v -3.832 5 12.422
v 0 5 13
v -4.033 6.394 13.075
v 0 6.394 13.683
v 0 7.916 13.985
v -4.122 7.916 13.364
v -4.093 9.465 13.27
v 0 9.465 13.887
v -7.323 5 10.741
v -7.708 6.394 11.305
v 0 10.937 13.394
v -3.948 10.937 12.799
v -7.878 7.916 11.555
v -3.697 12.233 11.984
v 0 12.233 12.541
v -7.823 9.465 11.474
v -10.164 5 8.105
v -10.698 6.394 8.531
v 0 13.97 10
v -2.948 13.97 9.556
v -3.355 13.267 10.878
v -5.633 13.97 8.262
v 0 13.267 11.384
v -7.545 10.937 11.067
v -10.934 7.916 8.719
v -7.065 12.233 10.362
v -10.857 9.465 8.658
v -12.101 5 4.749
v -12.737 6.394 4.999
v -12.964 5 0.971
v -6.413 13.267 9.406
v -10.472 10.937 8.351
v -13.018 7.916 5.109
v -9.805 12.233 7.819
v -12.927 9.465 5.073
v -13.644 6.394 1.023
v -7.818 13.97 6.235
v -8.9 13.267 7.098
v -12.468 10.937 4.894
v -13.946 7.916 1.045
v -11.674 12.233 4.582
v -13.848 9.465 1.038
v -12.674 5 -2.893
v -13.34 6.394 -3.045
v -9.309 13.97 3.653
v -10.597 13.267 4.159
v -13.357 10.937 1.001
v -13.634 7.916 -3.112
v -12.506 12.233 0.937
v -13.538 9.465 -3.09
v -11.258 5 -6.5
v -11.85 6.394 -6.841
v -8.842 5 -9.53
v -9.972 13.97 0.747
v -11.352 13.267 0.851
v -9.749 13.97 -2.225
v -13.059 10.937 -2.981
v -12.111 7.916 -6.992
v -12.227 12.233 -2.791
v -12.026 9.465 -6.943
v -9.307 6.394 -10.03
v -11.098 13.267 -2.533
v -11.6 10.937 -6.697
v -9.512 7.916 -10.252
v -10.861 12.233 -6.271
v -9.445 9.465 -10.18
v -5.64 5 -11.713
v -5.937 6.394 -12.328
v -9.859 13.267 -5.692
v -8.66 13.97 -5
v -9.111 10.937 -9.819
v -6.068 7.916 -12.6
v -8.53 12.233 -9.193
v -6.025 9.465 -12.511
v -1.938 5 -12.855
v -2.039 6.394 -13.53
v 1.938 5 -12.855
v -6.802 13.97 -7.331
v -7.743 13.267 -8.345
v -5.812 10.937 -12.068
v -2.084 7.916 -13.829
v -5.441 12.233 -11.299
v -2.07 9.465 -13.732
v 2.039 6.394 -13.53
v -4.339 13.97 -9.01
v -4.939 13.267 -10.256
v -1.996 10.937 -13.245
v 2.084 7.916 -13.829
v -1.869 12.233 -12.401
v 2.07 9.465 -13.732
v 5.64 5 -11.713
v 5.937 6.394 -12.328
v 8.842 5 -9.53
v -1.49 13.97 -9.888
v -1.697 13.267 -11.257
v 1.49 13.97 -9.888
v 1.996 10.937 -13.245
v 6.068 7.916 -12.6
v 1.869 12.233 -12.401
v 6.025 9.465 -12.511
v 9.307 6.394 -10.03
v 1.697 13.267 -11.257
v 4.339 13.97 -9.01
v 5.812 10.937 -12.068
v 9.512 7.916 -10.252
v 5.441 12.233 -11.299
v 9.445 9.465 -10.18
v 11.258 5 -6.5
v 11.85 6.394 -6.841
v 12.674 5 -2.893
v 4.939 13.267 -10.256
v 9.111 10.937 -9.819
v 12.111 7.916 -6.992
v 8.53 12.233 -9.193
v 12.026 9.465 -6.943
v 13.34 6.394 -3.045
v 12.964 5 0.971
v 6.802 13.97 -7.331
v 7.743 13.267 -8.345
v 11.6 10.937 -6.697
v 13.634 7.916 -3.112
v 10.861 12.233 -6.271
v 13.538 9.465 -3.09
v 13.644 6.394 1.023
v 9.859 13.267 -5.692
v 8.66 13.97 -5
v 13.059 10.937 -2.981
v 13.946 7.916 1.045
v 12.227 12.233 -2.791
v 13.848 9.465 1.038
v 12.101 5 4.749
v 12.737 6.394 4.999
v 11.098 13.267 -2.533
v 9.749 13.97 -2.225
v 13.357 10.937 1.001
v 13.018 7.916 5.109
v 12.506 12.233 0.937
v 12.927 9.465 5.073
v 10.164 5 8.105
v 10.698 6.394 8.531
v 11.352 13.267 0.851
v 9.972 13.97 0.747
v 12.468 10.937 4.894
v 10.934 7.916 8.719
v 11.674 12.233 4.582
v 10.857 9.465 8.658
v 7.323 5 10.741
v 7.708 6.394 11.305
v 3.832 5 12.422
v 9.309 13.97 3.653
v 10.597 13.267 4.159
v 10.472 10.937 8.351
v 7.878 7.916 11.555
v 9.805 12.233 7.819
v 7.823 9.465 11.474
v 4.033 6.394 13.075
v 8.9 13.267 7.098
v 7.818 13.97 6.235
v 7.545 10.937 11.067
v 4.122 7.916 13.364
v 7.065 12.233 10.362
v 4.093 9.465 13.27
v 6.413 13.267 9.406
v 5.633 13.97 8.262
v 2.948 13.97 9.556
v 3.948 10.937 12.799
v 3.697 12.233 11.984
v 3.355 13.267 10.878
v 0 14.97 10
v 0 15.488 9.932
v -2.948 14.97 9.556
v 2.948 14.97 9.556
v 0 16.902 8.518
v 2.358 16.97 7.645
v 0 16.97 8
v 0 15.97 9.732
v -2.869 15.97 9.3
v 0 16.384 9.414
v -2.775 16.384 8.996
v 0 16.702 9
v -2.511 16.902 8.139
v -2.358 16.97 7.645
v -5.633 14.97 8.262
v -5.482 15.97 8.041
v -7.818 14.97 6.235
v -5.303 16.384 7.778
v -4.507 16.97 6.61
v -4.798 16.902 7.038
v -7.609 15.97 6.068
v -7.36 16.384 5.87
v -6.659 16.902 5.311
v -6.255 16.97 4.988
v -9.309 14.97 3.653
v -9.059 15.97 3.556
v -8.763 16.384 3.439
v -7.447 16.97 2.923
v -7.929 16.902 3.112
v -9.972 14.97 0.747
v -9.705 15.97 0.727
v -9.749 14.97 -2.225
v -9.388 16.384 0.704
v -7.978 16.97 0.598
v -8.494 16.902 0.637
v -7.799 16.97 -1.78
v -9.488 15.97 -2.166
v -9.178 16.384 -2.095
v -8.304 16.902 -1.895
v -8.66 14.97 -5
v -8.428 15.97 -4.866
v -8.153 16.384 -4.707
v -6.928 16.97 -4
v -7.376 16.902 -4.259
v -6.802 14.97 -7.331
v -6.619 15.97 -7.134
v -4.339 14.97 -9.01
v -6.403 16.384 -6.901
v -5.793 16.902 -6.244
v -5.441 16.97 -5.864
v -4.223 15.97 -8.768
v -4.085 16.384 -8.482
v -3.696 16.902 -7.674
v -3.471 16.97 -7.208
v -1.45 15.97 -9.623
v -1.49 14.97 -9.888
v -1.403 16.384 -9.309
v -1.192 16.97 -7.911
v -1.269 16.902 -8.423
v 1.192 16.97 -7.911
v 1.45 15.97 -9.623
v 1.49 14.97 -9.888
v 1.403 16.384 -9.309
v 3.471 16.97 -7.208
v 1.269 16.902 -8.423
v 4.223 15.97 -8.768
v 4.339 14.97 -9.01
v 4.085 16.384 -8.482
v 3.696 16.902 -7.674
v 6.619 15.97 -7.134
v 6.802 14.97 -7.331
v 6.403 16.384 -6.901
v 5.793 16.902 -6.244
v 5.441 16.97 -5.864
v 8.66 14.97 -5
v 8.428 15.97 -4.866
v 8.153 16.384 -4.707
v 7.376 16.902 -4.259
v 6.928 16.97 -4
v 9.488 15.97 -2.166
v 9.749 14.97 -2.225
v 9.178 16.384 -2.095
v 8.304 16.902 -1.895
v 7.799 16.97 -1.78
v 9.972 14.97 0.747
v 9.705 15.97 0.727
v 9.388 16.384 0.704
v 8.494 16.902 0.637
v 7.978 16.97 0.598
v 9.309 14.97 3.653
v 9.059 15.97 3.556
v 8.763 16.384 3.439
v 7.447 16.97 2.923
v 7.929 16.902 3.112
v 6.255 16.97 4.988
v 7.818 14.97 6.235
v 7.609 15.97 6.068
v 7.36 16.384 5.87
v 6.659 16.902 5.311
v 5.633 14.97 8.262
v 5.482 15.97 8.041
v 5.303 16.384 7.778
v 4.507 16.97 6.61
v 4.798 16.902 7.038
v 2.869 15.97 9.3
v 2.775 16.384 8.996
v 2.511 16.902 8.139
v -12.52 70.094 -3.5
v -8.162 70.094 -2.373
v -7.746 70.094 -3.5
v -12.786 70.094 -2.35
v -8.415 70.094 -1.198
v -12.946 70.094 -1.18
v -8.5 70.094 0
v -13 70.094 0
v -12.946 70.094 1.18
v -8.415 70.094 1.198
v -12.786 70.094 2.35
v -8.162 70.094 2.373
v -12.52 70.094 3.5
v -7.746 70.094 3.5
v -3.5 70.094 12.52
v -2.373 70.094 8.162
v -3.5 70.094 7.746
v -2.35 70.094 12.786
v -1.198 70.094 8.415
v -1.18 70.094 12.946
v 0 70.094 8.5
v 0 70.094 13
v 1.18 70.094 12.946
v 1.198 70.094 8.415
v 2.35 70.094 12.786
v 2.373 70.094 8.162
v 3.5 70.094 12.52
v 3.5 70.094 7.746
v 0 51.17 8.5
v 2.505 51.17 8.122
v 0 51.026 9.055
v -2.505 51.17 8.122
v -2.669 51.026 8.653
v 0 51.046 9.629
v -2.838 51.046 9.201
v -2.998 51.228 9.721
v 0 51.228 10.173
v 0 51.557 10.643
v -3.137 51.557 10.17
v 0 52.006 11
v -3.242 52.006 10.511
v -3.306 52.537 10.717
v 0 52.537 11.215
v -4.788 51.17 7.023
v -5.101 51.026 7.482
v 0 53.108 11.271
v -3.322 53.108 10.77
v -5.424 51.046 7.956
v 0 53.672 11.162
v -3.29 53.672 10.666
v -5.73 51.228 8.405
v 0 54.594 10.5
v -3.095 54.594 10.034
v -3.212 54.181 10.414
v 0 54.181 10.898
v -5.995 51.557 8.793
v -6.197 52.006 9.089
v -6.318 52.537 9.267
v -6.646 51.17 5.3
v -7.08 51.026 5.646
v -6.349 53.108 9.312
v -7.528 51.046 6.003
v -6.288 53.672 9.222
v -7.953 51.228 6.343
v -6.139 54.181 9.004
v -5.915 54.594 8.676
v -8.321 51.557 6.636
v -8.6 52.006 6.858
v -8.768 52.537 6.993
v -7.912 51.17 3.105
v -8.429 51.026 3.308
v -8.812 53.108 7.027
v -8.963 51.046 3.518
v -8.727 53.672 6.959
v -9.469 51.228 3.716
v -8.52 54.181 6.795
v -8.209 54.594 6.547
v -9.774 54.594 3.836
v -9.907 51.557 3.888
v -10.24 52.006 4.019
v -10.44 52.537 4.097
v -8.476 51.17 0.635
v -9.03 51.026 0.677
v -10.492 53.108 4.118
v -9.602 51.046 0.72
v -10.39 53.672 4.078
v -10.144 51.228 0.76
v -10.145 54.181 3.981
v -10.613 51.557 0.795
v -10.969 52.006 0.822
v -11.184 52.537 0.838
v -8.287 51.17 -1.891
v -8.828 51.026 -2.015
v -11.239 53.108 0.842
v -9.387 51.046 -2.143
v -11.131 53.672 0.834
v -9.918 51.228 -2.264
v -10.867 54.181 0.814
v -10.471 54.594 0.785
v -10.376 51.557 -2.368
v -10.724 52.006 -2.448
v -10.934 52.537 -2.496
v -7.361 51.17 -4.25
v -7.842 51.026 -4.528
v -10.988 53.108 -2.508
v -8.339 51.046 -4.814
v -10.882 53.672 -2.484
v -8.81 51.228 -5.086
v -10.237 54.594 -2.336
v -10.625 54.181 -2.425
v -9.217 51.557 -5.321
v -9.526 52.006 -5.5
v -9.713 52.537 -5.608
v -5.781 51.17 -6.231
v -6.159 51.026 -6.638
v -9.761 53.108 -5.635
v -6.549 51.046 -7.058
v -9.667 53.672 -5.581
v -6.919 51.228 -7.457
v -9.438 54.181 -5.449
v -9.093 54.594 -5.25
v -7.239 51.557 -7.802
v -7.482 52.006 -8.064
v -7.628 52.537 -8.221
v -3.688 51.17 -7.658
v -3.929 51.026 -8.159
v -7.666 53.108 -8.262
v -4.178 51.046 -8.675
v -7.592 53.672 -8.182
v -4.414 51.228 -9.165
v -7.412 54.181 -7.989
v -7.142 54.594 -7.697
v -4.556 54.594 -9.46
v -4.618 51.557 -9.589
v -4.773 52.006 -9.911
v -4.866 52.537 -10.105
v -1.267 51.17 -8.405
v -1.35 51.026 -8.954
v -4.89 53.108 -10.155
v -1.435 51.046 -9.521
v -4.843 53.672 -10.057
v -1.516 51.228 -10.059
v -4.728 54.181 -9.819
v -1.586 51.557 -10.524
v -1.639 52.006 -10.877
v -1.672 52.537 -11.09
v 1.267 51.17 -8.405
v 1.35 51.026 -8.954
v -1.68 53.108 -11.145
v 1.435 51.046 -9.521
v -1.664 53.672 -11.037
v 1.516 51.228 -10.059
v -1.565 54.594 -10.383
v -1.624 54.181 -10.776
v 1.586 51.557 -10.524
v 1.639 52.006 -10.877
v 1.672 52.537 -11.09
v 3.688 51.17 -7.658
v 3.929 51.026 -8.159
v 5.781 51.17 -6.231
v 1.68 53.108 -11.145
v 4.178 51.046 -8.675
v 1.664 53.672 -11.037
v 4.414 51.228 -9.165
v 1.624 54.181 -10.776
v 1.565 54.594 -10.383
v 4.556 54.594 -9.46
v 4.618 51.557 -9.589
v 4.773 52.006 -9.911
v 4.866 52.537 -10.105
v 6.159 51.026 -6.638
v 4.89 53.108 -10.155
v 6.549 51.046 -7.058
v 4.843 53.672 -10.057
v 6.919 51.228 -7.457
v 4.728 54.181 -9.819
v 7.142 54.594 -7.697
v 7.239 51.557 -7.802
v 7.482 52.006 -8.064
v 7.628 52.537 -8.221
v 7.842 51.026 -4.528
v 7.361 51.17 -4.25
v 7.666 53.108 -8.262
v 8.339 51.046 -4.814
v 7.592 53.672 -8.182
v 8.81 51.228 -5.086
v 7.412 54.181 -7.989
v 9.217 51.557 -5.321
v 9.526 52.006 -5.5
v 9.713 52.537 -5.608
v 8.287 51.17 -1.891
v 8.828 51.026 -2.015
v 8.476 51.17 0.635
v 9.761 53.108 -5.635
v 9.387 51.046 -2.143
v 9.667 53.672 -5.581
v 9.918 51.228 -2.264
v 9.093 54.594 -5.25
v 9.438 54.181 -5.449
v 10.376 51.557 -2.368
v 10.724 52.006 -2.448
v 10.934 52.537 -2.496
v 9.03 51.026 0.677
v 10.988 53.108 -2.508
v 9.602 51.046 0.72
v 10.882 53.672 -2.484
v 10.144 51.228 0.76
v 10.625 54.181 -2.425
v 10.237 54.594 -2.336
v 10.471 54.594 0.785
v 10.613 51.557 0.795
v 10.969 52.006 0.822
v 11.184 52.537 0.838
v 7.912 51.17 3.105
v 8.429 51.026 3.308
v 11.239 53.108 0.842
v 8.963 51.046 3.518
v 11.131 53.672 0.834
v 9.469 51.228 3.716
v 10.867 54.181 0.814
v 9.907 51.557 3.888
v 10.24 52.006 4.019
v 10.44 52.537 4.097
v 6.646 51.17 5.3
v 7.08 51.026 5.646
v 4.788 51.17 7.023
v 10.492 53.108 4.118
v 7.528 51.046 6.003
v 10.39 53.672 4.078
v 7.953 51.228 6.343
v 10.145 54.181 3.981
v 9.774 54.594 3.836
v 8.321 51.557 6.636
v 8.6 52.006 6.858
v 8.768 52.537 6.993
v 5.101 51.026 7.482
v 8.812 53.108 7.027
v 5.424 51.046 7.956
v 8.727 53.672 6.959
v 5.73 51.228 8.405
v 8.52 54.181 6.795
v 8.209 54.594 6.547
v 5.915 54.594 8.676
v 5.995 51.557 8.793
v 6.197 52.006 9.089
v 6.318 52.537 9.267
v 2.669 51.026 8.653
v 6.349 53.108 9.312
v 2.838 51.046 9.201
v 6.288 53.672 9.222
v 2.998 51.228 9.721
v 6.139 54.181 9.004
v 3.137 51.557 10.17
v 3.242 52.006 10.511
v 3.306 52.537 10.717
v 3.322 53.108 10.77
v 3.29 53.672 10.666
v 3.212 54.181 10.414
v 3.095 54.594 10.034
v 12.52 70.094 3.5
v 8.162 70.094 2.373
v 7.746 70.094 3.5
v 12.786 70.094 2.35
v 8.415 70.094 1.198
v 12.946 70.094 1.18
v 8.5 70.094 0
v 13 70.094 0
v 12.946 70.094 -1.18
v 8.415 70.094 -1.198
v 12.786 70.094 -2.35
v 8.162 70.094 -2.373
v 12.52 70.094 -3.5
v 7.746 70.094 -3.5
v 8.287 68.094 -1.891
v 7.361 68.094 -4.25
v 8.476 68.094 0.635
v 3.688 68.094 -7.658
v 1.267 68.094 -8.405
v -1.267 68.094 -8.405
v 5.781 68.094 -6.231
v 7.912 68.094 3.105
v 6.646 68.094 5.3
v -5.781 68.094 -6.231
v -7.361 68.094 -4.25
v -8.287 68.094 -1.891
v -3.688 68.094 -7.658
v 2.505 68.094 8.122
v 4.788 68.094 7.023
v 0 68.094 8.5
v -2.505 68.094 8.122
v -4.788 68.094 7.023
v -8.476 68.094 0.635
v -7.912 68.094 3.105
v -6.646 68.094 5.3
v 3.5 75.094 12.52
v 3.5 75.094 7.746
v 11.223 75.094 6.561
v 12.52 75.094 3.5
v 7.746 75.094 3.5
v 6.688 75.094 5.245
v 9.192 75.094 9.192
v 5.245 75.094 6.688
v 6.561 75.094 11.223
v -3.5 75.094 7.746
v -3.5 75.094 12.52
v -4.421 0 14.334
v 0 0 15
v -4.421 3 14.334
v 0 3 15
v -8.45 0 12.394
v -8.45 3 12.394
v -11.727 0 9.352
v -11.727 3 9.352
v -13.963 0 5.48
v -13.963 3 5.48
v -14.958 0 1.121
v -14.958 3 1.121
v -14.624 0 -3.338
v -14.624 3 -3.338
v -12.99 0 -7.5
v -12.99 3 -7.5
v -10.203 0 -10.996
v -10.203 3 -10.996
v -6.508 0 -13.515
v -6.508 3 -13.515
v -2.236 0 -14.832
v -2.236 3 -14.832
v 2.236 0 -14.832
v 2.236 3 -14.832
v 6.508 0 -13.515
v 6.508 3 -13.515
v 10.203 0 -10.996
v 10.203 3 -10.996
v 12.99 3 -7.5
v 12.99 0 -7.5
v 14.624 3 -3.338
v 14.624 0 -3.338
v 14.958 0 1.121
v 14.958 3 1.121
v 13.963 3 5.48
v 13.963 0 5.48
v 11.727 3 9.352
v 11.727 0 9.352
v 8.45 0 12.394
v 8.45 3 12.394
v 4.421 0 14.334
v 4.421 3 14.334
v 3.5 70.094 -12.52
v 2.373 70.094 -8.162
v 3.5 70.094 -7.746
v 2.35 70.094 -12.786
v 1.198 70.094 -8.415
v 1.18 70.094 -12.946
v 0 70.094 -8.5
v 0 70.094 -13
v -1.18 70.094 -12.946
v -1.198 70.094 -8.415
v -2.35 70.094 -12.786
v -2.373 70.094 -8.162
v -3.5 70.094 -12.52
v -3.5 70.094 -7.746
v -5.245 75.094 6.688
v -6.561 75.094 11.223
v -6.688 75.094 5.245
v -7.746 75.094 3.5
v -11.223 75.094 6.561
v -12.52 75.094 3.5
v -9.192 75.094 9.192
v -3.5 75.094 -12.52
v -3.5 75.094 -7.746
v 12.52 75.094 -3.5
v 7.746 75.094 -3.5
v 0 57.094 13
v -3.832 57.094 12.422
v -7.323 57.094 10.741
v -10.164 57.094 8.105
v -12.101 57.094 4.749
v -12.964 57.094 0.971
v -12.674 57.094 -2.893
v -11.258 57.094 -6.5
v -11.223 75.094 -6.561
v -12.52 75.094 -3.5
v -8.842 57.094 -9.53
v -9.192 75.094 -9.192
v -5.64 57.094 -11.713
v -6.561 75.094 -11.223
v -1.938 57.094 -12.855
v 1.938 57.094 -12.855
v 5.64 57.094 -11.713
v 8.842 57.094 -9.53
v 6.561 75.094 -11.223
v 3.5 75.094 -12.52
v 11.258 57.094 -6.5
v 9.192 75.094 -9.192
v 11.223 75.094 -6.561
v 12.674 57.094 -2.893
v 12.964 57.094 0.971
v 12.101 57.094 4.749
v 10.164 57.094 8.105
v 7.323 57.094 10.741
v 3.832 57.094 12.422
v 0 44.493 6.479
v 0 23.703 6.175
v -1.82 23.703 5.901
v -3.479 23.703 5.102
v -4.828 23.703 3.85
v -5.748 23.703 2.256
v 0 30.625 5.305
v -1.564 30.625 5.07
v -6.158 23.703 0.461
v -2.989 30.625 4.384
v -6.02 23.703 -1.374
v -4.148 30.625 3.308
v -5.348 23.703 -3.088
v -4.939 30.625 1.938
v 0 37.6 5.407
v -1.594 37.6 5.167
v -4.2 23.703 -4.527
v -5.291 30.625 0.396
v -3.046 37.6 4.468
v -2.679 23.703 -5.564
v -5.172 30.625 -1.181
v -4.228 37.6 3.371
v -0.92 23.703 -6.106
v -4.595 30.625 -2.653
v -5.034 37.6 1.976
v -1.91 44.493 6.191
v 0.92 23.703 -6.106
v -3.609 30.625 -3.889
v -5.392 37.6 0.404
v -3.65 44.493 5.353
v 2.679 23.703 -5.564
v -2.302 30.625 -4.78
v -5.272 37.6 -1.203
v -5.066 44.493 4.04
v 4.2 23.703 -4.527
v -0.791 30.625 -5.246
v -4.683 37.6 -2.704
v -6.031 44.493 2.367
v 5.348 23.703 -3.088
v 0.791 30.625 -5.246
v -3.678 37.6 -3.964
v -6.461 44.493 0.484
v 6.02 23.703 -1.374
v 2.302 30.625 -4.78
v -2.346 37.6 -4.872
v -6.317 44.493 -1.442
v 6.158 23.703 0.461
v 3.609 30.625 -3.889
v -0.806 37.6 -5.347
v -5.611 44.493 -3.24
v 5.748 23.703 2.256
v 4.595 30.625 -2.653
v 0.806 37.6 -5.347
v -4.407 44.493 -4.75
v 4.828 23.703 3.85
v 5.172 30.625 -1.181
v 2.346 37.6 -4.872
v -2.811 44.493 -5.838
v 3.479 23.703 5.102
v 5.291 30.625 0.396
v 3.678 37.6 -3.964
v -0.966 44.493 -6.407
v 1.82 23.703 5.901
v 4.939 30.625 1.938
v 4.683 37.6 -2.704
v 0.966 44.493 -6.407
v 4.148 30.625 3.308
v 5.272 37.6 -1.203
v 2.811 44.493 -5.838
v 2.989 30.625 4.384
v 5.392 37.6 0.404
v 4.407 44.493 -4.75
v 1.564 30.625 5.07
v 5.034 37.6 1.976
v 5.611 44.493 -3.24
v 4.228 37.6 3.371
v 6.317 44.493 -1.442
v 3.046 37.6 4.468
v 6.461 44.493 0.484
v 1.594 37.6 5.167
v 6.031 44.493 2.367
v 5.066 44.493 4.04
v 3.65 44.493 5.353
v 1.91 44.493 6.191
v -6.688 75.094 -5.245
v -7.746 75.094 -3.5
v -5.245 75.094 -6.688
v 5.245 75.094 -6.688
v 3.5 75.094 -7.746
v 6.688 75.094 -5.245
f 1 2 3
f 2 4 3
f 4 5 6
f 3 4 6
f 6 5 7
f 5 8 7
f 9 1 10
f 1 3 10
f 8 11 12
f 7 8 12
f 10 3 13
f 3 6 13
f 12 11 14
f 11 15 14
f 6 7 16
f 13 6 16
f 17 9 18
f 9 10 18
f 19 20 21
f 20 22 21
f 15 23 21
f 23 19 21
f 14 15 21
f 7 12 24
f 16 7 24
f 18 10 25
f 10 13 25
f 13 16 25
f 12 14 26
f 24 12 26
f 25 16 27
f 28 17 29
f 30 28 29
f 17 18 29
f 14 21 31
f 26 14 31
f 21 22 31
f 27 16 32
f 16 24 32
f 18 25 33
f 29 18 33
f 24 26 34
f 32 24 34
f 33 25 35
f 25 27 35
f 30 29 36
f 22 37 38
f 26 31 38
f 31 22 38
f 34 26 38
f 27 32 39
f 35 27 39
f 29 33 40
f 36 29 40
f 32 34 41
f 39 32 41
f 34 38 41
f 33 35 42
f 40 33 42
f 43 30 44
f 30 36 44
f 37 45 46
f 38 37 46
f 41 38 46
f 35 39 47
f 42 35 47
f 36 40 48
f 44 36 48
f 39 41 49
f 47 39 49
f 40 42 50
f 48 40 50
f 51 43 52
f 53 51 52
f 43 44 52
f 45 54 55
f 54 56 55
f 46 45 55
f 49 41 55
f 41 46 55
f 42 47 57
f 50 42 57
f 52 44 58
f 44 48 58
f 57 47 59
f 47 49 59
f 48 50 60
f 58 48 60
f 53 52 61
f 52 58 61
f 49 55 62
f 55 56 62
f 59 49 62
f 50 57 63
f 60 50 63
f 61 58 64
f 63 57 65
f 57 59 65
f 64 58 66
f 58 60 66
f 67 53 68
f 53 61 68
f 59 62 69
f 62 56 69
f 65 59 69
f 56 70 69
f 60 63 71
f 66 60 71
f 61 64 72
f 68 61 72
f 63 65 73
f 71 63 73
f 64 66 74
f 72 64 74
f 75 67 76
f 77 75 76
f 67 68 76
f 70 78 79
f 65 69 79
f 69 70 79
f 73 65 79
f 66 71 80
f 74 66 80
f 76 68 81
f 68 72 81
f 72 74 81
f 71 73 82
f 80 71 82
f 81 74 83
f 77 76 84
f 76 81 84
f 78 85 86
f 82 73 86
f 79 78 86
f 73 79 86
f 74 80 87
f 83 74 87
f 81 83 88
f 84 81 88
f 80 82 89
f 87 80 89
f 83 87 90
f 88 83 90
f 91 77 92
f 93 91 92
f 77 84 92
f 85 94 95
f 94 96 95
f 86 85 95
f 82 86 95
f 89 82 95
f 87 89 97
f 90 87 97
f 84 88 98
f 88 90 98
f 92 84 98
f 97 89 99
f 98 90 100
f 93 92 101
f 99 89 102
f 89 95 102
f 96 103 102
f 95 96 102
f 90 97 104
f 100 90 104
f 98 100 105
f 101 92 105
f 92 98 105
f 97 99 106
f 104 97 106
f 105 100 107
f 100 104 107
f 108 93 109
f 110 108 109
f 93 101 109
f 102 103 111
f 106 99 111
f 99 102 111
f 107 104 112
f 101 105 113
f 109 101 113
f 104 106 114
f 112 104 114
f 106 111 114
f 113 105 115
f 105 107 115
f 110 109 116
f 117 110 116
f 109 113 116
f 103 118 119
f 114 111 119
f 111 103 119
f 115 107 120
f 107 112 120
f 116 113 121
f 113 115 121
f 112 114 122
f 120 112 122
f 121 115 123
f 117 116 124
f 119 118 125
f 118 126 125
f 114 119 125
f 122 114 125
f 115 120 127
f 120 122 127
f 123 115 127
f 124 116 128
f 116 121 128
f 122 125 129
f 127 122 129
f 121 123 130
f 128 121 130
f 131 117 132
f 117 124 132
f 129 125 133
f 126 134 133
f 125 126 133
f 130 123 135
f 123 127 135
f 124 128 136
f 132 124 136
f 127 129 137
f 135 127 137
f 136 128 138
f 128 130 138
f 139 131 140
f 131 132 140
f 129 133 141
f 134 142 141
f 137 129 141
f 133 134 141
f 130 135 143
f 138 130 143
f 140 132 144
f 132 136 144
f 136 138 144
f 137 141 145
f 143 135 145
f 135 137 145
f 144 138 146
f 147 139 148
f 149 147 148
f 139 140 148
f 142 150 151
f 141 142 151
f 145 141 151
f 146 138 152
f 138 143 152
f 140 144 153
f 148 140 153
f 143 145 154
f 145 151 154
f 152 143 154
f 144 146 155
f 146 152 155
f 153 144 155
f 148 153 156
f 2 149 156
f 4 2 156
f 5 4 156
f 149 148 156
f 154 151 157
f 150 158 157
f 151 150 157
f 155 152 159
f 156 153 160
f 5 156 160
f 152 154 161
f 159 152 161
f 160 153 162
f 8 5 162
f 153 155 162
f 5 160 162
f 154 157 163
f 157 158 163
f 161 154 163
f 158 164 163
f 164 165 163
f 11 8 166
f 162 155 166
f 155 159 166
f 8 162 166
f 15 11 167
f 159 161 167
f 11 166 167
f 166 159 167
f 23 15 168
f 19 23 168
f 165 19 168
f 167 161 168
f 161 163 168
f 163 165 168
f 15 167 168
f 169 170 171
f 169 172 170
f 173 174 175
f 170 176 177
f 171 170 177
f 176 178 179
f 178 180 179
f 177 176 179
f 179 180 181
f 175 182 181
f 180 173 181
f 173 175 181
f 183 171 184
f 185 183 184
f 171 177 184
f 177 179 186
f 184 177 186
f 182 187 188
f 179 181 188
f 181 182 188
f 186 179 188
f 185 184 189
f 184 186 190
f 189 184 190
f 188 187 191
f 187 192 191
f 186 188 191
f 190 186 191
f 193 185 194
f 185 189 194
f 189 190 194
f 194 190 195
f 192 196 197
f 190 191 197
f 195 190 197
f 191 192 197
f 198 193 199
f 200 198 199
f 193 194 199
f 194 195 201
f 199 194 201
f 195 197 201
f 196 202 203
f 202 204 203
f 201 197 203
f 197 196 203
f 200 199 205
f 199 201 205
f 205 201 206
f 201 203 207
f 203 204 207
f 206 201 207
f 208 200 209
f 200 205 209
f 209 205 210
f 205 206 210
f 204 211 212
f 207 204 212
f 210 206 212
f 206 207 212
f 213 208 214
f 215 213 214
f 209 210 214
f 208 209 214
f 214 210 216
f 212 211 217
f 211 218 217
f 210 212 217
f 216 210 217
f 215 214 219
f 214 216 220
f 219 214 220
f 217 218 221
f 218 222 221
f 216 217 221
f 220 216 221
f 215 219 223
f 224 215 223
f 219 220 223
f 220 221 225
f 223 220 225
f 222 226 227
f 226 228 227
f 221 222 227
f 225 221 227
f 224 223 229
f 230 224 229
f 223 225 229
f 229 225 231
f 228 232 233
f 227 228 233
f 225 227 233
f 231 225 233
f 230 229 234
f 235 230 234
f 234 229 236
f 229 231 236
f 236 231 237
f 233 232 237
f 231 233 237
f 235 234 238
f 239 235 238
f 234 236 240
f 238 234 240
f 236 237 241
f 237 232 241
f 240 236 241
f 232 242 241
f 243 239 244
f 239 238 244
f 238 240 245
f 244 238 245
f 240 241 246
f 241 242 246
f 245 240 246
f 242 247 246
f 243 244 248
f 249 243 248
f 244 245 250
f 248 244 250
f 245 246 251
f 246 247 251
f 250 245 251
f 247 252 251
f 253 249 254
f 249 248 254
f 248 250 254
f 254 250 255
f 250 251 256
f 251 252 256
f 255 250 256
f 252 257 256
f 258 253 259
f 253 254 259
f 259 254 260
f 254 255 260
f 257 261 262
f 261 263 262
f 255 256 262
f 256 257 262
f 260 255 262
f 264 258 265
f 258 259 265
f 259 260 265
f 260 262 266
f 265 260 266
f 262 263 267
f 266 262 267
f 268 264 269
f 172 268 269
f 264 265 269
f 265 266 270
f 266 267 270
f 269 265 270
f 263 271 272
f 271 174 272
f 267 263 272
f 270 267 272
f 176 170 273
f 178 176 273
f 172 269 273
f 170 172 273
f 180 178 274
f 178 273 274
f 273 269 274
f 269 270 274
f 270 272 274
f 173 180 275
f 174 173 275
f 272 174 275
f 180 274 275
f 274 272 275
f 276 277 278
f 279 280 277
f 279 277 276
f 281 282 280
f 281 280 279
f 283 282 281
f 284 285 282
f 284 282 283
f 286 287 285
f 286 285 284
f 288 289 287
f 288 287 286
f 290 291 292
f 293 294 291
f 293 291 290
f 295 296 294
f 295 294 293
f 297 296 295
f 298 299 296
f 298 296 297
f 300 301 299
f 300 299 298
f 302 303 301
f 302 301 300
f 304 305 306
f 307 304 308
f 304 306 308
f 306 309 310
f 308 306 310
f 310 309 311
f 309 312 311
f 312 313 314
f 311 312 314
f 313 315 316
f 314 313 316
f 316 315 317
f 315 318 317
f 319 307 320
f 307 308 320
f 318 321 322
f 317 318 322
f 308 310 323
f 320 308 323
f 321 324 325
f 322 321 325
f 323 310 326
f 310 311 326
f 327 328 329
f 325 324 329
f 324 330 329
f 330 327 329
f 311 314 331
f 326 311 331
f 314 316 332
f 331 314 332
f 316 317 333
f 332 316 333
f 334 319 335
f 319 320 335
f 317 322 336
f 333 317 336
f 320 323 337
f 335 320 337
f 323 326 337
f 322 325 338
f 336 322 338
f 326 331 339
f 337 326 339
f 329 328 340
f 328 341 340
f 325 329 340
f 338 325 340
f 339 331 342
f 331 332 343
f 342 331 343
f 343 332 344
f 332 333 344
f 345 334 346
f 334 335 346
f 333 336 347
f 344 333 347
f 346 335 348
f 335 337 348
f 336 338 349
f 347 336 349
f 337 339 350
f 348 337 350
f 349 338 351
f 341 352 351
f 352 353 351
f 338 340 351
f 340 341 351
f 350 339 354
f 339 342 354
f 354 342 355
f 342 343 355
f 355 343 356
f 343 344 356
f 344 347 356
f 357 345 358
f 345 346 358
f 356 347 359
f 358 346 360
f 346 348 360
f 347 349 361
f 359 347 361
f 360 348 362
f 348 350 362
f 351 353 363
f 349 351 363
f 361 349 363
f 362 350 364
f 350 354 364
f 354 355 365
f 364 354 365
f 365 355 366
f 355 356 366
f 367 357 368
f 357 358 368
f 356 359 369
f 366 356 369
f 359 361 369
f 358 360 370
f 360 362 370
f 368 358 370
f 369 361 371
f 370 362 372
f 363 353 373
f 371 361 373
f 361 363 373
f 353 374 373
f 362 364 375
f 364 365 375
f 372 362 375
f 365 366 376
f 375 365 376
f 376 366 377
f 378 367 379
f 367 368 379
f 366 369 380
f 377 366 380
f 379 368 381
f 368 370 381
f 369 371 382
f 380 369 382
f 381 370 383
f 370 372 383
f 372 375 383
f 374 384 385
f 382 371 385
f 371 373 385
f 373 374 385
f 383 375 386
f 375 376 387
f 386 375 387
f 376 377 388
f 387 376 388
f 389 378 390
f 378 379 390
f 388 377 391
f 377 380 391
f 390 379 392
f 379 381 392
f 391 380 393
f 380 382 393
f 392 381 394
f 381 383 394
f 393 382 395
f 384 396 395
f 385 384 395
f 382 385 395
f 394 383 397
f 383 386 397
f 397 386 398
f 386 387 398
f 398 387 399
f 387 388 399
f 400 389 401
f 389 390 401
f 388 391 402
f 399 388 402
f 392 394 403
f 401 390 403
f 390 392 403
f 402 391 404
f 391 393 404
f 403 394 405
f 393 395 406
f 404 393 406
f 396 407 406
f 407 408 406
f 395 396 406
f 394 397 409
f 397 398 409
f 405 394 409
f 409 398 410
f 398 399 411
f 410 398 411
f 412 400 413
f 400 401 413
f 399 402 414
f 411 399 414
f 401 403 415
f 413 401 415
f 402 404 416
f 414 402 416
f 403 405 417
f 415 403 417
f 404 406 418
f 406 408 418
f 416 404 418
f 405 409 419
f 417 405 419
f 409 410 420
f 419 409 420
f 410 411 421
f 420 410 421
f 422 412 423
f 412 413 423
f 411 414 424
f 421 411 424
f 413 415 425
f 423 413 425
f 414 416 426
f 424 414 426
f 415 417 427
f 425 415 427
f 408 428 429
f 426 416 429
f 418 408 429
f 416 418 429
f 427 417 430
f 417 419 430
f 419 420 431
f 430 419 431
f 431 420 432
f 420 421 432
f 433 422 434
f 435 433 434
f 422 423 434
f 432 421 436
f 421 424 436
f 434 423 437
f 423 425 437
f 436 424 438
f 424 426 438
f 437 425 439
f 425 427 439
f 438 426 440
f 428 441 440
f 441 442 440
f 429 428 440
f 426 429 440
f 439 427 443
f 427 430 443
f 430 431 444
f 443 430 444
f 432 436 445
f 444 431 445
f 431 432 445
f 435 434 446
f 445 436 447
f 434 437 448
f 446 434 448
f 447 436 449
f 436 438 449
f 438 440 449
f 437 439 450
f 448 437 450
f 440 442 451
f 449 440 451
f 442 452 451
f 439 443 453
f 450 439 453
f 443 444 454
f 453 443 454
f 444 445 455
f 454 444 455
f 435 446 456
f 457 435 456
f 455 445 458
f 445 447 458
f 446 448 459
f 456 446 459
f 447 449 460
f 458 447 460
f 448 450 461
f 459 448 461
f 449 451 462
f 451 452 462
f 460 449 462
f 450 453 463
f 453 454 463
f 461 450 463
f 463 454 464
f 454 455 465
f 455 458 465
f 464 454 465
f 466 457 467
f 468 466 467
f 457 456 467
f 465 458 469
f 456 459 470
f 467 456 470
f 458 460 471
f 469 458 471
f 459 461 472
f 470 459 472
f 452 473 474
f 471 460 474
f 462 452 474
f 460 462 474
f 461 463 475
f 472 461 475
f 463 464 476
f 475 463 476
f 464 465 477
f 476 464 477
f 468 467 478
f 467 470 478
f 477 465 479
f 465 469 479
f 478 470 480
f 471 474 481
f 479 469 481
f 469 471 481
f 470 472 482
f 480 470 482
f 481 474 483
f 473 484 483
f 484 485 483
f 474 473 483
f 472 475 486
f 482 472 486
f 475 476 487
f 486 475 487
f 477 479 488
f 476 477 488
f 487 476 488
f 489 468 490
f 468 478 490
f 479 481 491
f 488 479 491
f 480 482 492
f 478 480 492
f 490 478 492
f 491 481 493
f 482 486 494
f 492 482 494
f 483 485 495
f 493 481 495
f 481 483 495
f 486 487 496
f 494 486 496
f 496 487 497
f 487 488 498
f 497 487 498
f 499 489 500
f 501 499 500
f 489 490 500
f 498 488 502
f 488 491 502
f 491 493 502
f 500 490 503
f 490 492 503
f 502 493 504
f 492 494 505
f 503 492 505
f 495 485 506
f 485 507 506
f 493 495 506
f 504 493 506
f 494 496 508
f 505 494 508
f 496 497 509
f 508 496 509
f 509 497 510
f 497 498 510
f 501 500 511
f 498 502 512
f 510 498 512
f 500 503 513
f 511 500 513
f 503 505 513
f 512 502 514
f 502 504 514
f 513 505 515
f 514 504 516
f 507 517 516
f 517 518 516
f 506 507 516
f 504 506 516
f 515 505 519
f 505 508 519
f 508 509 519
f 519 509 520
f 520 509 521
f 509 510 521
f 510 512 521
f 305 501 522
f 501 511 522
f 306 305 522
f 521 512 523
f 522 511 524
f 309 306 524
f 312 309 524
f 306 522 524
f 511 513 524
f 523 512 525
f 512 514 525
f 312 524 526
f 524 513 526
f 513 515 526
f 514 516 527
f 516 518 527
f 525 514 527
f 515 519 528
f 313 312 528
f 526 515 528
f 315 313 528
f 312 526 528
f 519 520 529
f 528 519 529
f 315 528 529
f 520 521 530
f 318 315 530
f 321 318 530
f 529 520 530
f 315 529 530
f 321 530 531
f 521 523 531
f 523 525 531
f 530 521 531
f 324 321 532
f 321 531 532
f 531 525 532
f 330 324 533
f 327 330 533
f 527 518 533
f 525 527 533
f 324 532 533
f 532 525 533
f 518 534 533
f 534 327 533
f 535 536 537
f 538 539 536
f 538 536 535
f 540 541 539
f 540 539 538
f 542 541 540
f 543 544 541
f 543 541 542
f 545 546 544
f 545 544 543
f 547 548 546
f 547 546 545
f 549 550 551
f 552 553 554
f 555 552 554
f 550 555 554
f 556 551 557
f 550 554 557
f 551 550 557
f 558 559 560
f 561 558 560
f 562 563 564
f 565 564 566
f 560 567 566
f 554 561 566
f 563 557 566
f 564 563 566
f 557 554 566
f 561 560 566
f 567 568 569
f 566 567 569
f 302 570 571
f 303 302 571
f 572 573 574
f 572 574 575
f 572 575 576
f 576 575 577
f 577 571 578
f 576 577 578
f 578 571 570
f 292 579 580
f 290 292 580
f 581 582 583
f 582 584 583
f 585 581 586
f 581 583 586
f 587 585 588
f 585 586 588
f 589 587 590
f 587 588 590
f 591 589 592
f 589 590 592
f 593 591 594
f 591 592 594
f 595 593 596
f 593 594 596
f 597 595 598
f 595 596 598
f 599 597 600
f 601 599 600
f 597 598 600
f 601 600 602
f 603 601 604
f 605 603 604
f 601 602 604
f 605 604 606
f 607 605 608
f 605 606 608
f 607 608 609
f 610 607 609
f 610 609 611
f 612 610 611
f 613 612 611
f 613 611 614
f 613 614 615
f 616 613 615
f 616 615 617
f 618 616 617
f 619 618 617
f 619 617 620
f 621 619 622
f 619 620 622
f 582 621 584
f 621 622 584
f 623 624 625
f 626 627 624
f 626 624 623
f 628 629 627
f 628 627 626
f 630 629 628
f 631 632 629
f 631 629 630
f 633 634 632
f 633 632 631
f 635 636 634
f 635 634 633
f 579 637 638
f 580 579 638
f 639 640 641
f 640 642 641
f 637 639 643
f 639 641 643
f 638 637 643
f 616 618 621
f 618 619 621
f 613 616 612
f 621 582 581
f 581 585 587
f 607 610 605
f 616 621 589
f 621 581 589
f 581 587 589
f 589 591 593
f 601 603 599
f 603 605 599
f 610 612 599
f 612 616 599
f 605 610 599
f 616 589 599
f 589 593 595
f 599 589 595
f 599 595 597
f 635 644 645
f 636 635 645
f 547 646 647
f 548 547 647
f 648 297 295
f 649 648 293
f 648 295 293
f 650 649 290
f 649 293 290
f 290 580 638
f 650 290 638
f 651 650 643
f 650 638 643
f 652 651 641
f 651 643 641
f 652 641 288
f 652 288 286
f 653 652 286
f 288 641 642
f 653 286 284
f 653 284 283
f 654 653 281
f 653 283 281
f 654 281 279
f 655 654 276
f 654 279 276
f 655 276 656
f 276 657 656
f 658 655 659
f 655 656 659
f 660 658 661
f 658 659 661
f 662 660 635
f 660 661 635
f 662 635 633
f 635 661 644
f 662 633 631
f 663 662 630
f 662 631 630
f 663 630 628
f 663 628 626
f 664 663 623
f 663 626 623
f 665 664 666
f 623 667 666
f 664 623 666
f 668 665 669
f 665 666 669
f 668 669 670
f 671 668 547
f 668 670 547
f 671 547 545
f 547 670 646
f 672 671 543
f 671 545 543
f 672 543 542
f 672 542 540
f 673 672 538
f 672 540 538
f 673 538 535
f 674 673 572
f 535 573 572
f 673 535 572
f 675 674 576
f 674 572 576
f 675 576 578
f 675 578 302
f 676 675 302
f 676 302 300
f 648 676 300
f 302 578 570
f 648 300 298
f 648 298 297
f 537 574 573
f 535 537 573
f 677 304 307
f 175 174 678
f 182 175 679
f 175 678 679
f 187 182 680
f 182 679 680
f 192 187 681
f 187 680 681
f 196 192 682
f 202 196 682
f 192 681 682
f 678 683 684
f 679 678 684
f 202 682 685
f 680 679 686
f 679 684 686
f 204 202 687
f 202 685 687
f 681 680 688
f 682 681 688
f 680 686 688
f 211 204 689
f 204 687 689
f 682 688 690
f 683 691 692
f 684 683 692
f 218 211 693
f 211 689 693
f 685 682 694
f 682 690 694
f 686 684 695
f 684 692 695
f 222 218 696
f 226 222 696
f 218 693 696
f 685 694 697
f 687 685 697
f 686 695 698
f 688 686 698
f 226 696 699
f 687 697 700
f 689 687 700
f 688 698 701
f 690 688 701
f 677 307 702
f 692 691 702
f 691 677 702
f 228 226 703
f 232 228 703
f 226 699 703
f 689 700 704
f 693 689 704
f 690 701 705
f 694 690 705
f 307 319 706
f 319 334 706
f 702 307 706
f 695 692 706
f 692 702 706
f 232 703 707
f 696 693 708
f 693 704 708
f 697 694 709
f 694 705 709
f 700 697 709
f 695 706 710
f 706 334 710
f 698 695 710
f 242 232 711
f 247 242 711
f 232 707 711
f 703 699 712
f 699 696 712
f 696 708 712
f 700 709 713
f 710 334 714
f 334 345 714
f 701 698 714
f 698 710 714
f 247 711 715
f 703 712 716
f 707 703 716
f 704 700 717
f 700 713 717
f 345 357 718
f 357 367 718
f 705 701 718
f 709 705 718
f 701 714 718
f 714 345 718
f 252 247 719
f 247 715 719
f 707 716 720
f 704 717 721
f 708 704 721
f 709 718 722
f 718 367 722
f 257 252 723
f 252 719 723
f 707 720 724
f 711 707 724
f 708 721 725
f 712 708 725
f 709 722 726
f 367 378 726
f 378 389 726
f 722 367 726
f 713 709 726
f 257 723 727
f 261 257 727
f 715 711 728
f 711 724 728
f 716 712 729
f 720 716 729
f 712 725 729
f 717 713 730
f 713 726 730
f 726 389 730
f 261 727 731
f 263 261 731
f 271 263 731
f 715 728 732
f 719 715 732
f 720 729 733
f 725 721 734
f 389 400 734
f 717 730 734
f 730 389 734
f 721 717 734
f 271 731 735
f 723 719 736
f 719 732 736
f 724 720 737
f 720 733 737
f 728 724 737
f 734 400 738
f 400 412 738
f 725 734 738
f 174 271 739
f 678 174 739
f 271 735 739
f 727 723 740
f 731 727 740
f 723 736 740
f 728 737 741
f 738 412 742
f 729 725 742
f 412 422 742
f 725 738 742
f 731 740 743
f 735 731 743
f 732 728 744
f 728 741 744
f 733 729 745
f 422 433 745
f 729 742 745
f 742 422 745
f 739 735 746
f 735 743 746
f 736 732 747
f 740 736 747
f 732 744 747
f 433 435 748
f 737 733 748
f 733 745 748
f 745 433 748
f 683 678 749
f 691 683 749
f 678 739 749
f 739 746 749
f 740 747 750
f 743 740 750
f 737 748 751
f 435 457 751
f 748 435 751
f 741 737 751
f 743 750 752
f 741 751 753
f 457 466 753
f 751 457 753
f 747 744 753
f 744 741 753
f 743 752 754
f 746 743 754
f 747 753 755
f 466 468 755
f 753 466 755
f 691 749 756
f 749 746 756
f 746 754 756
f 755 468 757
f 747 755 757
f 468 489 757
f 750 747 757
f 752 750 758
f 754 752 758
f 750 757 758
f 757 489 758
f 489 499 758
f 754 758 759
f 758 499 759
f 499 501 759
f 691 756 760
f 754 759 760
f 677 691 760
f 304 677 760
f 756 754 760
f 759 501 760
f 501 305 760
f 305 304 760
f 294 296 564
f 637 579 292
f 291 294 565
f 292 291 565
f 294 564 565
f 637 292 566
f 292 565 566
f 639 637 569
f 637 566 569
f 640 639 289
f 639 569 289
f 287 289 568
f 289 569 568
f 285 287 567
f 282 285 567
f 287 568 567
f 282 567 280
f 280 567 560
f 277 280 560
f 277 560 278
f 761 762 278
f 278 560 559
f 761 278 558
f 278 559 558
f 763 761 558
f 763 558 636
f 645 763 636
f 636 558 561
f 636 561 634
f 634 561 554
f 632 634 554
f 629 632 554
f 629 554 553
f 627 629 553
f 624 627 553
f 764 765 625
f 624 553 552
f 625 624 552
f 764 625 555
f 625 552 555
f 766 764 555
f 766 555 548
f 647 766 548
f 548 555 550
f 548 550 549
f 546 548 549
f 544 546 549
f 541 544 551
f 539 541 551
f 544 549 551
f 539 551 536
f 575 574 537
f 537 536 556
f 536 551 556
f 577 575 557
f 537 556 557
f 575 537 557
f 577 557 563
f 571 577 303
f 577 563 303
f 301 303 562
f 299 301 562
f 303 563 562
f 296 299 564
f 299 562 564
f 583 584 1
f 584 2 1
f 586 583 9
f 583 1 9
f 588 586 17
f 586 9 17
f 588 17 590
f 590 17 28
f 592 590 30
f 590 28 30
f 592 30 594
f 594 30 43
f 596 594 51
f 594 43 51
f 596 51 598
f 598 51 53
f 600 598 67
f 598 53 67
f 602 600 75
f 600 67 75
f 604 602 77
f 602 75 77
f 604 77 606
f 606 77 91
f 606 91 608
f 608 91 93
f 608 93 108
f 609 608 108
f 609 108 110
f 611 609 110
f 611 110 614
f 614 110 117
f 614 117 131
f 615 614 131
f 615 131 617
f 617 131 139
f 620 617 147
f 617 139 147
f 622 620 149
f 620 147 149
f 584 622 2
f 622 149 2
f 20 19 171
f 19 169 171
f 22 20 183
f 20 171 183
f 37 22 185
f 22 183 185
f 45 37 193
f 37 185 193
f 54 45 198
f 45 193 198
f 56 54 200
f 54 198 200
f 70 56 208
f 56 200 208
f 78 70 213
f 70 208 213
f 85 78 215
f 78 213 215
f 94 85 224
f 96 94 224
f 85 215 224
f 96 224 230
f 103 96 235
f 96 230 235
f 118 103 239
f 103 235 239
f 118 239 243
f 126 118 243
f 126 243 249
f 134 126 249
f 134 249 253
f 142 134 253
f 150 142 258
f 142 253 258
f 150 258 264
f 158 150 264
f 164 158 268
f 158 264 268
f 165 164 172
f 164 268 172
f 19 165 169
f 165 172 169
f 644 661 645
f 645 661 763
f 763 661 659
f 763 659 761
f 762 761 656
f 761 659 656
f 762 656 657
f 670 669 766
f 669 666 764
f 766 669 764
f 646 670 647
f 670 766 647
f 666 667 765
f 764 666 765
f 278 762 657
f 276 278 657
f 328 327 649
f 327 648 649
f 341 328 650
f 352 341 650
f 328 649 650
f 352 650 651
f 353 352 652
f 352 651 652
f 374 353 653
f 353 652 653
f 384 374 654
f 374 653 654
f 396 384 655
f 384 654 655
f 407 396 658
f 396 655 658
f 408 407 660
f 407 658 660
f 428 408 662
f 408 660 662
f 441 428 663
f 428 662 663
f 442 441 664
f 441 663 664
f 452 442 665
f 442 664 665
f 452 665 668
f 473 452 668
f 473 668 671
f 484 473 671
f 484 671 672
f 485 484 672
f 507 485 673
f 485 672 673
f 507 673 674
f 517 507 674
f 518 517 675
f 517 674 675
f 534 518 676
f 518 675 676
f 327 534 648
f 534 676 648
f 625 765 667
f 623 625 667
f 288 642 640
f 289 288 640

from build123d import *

# Parameters (mm, degrees)
CUT_EXTRUDE1_DEPTH = 5
CIRPATTERN1_COUNT  = 4


with BuildPart() as part:
    # Sketch1 → Revolve2 (revolve)
    with BuildSketch(Plane.XY, mode=Mode.PRIVATE) as revolve2_sk:
        with BuildLine():
            Line((0, 0), (-15, 0))
            Line((-15, 0), (-15, 3))
            Line((-15, 3), (-13, 5))
            ThreePointArc((-13, 5), (-13.688325627, 10.216881481), (-10, 13.97))
            Line((-10, 13.97), (-10, 14.97))
            ThreePointArc((-10, 14.97), (-9.414213562, 16.384213562), (-8, 16.97))
            ThreePointArc((-8, 16.97), (-5.234654729, 34.114083995), (-8.5, 51.17))
            ThreePointArc((-8.5, 51.17), (-11, 52.00581604), (-10.5, 54.593979182))
            Line((-10.5, 54.593979182), (-13, 57.093979182))
            Line((-13, 57.093979182), (-13, 75.093979182))
            Line((-13, 75.093979182), (-8.5, 75.093979182))
            Line((-8.5, 75.093979182), (-8.5, 68.093979182))
            Line((-8.5, 68.093979182), (0, 68.093979182))
            Line((0, 68.093979182), (0, 0))
        make_face()
    revolve(revolve2_sk.sketch.rotate(Axis((0, 75.093979182, 0), (0, -1, 0)), 270), axis=Axis((0, 75.093979182, 0), (0, -1, 0)))

    # Sketch2 → Cut-Extrude1 (cut)
    with BuildSketch(Plane(origin=(0, 75.093979182, 0), x_dir=(1, 0, 0), z_dir=(0, 1, 0))):
        with BuildLine():
            ThreePointArc((8.5, 0), (8.309353672, -1.790151267), (7.745966692, -3.5))
            Line((7.745966692, -3.5), (12.519984026, -3.5))
            ThreePointArc((12.519984026, -3.5), (12.879436951, -1.766381565), (13, 0))
            ThreePointArc((13, 0), (12.879436951, 1.766381565), (12.519984026, 3.5))
            Line((12.519984026, 3.5), (7.745966692, 3.5))
            ThreePointArc((7.745966692, 3.5), (8.309353672, 1.790151267), (8.5, 0))
        make_face()
    cut_extrude1 = extrude(amount=-CUT_EXTRUDE1_DEPTH, mode=Mode.SUBTRACT)

    # CirPattern1: Cut-Extrude1 ×4 about axis
    cirpattern1_axis = Axis((0, 0, 0), (0, 1, 0))
    for i in range(1, CIRPATTERN1_COUNT):
        add(cut_extrude1.rotate(cirpattern1_axis, i * 360 / CIRPATTERN1_COUNT), mode=Mode.SUBTRACT)


solid = part.part
